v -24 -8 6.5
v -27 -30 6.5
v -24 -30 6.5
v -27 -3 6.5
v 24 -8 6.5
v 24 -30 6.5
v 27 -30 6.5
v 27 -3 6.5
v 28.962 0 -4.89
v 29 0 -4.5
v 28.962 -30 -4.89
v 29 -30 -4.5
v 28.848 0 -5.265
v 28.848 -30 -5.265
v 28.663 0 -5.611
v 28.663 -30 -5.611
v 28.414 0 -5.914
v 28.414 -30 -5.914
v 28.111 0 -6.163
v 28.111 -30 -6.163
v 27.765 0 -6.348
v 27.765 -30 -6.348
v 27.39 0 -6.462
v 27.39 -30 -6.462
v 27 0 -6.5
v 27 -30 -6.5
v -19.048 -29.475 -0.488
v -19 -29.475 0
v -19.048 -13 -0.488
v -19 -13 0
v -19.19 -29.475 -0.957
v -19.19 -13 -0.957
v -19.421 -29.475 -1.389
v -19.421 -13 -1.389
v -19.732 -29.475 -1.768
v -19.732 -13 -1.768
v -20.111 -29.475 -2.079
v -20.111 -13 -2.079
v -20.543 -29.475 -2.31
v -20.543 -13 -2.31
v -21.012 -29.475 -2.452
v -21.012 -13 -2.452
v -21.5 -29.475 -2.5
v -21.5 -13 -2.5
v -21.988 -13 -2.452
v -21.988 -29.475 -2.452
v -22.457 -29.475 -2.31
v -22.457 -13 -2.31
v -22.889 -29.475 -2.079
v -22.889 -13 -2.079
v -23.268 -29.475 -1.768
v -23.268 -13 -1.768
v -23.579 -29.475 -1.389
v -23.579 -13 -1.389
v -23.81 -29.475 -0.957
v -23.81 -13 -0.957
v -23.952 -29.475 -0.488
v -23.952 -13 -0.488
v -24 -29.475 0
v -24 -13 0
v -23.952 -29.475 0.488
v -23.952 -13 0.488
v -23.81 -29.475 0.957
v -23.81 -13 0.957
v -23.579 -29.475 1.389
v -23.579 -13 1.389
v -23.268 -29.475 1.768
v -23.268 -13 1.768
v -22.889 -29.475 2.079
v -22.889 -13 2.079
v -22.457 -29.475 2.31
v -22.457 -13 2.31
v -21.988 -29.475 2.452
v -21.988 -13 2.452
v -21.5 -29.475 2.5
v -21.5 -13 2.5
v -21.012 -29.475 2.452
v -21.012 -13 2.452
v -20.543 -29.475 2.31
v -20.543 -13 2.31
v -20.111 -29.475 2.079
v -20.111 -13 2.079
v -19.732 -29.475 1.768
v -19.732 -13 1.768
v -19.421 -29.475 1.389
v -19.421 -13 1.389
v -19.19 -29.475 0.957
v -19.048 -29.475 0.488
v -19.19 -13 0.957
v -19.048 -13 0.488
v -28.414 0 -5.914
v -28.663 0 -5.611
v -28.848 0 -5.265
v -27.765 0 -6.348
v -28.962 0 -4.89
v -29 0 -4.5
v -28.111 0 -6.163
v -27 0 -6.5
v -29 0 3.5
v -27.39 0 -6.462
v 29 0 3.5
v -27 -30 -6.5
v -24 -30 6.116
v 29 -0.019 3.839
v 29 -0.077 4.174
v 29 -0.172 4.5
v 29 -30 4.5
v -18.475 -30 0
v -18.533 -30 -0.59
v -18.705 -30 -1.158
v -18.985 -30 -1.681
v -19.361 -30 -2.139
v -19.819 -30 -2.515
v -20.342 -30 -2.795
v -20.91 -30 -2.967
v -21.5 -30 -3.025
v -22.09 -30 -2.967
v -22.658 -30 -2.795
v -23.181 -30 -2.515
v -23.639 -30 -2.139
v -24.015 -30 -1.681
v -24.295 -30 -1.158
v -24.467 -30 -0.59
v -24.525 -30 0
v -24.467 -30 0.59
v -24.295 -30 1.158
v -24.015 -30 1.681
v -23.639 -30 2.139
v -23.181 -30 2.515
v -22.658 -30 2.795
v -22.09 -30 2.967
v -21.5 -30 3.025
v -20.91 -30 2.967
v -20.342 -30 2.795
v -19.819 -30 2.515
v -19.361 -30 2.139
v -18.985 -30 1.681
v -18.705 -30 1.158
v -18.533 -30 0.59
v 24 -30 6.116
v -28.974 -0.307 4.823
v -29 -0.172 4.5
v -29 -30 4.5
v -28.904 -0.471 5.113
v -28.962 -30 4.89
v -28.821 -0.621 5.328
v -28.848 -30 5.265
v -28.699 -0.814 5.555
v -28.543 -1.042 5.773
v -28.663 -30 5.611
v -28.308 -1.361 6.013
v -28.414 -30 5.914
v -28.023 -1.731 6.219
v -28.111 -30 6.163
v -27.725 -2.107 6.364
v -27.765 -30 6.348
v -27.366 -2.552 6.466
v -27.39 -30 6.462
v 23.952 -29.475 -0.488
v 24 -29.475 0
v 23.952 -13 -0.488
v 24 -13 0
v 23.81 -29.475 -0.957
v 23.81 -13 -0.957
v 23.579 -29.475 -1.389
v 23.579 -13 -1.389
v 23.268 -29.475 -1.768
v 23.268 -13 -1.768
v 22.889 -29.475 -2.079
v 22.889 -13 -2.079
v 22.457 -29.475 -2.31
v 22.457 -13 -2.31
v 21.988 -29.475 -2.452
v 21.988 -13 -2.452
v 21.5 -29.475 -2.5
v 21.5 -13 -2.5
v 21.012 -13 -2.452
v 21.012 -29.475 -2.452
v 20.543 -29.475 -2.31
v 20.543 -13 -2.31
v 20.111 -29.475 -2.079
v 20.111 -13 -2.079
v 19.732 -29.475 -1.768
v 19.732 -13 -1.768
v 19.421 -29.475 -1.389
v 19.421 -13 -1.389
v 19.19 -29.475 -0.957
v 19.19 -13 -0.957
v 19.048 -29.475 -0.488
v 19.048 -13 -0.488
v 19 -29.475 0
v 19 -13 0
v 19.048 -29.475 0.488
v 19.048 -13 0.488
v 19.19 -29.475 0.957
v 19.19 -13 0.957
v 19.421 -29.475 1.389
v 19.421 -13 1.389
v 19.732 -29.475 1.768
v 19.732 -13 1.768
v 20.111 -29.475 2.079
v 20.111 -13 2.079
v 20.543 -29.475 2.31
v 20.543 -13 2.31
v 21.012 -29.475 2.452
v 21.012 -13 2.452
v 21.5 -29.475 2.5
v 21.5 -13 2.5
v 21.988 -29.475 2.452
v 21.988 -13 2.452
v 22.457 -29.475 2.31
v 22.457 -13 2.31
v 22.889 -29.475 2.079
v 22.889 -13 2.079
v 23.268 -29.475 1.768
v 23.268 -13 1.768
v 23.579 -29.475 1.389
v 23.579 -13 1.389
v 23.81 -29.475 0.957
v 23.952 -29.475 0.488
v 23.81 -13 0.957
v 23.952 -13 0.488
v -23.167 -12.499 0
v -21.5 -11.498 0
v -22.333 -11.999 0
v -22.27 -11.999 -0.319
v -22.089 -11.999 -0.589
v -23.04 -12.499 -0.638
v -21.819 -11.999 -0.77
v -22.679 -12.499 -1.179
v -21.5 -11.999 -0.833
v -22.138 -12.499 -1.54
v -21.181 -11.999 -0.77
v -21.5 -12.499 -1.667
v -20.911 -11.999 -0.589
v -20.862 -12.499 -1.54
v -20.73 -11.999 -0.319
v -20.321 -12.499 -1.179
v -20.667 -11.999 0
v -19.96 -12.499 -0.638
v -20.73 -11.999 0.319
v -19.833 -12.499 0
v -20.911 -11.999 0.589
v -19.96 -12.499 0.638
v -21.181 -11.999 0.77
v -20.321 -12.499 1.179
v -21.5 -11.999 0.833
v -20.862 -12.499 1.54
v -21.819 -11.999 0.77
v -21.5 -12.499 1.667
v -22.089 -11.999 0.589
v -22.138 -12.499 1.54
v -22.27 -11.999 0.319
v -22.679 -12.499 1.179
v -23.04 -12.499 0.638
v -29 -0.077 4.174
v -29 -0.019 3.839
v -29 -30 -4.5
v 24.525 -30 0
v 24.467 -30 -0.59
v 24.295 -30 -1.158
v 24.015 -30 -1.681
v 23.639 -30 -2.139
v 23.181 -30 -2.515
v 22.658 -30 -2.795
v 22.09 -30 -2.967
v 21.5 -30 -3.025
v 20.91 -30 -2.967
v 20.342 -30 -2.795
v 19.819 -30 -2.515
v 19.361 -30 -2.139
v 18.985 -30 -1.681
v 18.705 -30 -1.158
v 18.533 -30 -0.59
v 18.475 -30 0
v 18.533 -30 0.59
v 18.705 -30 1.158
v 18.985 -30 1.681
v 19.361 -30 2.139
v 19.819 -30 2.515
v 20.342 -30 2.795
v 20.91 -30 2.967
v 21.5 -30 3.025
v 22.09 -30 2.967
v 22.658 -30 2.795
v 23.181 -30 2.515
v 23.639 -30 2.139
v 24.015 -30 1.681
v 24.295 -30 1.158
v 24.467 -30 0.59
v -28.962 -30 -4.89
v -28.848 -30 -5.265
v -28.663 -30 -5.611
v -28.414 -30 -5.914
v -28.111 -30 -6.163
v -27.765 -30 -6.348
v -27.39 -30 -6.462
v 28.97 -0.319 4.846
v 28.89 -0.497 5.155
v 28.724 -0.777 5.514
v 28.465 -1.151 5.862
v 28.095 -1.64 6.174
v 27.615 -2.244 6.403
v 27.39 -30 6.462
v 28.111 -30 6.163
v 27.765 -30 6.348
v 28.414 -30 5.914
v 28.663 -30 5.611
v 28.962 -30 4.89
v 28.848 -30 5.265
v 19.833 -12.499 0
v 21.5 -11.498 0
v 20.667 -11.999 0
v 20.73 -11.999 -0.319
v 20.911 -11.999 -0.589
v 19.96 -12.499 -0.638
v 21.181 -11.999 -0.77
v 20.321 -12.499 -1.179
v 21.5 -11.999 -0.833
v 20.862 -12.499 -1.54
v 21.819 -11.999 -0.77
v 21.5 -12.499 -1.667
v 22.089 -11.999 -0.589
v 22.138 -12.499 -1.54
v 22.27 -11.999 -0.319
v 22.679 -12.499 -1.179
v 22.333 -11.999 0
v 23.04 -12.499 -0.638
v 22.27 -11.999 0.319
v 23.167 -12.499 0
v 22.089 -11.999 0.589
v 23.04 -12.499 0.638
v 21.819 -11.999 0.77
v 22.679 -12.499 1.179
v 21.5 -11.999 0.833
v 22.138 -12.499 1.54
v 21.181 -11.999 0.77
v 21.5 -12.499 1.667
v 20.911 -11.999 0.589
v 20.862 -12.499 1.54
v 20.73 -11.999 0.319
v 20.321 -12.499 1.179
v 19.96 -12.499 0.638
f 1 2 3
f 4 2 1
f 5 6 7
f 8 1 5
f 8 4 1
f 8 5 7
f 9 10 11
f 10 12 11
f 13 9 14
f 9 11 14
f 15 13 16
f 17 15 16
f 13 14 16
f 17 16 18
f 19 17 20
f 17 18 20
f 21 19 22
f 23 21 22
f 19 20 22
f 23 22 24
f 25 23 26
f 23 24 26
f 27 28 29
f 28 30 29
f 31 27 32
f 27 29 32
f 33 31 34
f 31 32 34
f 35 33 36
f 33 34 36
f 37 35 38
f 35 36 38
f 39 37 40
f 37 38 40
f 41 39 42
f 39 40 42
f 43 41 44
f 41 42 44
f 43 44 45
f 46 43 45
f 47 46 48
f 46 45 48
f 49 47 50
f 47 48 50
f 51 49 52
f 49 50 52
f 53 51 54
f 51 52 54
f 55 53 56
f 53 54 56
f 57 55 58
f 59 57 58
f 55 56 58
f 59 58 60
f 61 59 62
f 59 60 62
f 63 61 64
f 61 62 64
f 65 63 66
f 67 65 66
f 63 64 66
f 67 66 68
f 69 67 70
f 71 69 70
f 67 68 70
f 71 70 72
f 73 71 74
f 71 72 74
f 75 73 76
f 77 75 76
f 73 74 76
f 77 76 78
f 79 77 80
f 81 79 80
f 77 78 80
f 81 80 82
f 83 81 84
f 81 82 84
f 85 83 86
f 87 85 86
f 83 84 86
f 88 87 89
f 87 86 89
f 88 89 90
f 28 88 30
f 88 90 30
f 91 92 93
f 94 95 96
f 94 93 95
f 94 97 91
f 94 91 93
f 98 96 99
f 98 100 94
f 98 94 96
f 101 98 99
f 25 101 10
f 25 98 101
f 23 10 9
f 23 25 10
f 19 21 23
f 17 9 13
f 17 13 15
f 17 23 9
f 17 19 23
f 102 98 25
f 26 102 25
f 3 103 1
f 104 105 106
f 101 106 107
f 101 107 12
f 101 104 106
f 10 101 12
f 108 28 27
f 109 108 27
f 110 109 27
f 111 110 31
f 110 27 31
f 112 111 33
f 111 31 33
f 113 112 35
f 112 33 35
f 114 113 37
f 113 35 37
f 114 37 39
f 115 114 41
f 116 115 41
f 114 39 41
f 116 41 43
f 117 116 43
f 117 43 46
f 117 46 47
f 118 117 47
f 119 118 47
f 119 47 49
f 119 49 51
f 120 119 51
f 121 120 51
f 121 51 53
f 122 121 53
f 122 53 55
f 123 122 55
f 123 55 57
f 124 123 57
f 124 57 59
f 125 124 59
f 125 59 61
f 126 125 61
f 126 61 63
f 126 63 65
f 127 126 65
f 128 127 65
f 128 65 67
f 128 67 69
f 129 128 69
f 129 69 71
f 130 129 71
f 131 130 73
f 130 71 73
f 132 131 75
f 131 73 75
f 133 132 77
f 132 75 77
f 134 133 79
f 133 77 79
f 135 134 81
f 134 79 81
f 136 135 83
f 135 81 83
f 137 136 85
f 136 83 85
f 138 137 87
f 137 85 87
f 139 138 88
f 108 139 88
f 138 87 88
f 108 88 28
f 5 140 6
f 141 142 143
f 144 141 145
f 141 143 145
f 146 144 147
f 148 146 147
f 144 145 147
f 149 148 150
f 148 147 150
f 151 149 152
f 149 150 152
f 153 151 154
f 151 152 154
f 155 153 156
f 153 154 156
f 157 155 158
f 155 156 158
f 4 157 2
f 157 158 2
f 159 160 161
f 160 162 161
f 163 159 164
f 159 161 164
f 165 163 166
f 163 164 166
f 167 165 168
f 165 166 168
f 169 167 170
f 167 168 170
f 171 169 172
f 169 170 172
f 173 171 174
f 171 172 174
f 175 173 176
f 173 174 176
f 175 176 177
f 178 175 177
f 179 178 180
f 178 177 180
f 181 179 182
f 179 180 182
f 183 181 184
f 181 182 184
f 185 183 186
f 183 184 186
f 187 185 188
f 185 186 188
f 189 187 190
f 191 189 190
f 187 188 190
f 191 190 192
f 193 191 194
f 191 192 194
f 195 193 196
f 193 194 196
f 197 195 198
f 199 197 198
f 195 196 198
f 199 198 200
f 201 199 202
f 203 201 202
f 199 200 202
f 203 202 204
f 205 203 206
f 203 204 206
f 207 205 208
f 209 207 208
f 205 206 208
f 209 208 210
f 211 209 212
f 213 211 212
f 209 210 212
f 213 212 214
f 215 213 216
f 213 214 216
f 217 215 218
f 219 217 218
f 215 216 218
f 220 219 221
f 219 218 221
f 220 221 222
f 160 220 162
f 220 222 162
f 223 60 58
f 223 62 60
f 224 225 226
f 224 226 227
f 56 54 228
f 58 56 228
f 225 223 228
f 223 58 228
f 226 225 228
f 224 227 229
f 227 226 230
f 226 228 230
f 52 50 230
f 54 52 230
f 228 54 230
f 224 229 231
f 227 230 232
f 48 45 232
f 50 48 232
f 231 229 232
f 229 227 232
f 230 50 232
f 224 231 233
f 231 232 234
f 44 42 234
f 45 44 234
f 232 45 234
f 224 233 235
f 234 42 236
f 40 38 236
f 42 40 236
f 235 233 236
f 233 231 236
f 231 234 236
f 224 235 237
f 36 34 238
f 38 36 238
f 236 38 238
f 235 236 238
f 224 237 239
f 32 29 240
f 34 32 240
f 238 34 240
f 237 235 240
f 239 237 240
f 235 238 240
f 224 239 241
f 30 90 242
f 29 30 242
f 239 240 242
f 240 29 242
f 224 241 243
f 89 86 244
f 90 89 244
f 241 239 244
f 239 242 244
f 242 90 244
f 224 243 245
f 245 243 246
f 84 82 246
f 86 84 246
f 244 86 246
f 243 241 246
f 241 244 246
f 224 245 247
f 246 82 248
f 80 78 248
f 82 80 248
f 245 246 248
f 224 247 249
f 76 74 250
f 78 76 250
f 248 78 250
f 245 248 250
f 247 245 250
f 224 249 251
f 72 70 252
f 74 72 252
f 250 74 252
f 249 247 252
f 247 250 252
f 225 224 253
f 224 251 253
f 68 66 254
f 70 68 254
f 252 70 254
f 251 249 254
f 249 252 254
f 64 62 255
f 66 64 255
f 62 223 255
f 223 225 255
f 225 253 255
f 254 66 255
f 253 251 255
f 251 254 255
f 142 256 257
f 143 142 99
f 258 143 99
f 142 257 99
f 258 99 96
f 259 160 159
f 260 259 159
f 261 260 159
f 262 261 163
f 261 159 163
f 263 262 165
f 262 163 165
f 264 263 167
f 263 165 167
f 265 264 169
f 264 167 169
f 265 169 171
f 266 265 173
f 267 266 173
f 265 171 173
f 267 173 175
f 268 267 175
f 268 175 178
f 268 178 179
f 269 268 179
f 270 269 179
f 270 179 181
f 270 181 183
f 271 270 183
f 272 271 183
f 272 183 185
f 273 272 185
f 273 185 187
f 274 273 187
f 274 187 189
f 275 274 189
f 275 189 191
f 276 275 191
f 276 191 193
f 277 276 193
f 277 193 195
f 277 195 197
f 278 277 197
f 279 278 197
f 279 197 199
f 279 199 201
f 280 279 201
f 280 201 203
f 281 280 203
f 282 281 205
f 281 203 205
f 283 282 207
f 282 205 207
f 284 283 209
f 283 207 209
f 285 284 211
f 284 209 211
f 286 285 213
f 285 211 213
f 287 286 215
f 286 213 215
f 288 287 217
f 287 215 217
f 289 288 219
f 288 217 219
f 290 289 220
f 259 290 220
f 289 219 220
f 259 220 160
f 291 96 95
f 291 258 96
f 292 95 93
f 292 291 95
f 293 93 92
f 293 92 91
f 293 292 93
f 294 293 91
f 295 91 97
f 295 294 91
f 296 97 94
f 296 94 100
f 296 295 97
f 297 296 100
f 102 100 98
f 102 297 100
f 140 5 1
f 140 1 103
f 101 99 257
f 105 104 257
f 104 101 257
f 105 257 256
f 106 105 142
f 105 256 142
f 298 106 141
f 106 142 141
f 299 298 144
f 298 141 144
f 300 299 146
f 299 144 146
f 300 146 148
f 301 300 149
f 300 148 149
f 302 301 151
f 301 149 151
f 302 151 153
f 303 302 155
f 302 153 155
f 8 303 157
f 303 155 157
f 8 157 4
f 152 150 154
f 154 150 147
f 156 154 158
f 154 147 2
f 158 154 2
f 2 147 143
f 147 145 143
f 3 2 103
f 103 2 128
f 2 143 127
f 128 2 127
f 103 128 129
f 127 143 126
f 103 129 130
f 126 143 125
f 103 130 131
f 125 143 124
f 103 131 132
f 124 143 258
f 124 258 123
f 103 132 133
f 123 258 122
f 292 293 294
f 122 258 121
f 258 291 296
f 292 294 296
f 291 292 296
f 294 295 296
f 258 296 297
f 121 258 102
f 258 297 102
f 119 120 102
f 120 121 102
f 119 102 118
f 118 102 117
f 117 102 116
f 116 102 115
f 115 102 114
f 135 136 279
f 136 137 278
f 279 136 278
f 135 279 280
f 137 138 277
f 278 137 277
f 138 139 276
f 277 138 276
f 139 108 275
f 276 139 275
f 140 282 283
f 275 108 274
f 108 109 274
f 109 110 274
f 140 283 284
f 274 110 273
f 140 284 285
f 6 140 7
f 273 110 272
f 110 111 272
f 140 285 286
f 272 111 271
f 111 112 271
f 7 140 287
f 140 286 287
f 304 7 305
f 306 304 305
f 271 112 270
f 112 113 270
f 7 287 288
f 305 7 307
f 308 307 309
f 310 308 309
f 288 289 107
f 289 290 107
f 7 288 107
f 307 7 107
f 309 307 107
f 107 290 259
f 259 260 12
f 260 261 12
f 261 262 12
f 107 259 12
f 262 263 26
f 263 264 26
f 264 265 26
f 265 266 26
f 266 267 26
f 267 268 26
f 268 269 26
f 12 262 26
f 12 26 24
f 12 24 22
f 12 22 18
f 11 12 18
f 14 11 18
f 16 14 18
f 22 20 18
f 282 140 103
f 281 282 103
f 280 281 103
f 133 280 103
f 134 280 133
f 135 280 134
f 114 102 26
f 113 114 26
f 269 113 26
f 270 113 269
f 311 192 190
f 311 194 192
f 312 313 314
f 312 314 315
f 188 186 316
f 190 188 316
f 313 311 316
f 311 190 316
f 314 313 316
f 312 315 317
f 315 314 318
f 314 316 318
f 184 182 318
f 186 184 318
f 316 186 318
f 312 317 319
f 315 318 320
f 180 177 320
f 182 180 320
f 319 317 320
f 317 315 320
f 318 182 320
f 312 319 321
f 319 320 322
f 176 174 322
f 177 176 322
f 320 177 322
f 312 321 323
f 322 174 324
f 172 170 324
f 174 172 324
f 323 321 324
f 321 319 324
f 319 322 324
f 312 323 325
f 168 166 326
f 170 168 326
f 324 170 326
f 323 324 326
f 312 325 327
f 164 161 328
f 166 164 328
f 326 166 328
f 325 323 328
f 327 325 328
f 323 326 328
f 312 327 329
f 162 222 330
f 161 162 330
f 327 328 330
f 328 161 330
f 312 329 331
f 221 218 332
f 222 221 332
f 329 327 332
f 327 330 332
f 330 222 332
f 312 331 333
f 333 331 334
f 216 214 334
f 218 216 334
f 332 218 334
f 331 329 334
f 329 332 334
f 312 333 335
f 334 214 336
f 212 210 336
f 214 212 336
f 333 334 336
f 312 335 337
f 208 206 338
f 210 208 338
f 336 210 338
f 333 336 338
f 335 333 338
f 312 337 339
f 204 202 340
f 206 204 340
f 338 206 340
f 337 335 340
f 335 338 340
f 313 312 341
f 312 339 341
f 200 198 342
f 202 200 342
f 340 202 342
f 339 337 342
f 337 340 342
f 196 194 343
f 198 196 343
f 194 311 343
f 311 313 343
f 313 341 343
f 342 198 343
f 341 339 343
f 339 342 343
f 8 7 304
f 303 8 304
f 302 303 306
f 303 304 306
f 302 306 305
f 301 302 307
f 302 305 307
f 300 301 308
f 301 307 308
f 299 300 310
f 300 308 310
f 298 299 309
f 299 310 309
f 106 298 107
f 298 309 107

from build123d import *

# Parameters (mm, degrees)
SKETCH1_W                   = 58
SKETCH1_H                   = 13
BOSS_EXTRUDE1_DEPTH         = 30
FILLET1_R                   = 2
FILLET2_R                   = 3
M6_TAPPED_HOLE1_D           = 5
M6_TAPPED_HOLE1_DEPTH       = 17
M6_TAPPED_HOLE1_CSINK_D     = 6.05
M6_TAPPED_HOLE1_CSINK_ANGLE = 90
M6_TAPPED_HOLE1_TIP         = 1.502151548
CUT_EXTRUDE1_DEPTH          = 24


with BuildPart() as part:
    # Sketch1 → Boss-Extrude1 (new body)
    with BuildSketch(Plane(origin=(0, 0, 0), x_dir=(1, 0, 0), z_dir=(0, 1, 0))):
        Rectangle(SKETCH1_W, SKETCH1_H)
    extrude(amount=-BOSS_EXTRUDE1_DEPTH)

    # Fillet1
    fillet1_edges = [part.edges().sort_by_distance(p)[0] for p in [
        (29, -15, 6.5),
        (-29, -15, 6.5),
        (-29, -15, -6.5),
        (29, -15, -6.5),
    ]]
    fillet(fillet1_edges, radius=FILLET1_R)

    # Fillet2
    # the kernel refuses this fillet: 3 mm, written as the material it takes off along each edge
    with BuildSketch(Plane(origin=(-34.5, 0, 6.5), x_dir=(0, -1, 0), z_dir=(1, 0, 0))) as fillet2_piece_1:
        with BuildLine():
            CenterArc((FILLET2_R, FILLET2_R), FILLET2_R, 180, 90)
            Line((0, FILLET2_R), (0, 0))
            Line((0, 0), (FILLET2_R, 0))
        make_face()
    extrude(amount=69, mode=Mode.SUBTRACT)

    # M6 Tapped Hole1
    with Locations(Plane(origin=(0, -30, 0), x_dir=(-1, 0, 0), z_dir=(0, -1, 0))):
        with Locations((-21.5, 0), (21.5, 0)):
            CounterSinkHole(M6_TAPPED_HOLE1_D / 2, M6_TAPPED_HOLE1_CSINK_D / 2, depth=M6_TAPPED_HOLE1_DEPTH, counter_sink_angle=M6_TAPPED_HOLE1_CSINK_ANGLE)
            with Locations((0, 0, -(M6_TAPPED_HOLE1_DEPTH + M6_TAPPED_HOLE1_TIP / 2))):  # 118° drill point
                Cone(0, M6_TAPPED_HOLE1_D / 2, M6_TAPPED_HOLE1_TIP, mode=Mode.SUBTRACT)

    # Sketch5 → Cut-Extrude1 (cut, symmetric)
    with BuildSketch(Plane(origin=(0, 0, 0), x_dir=(0, 0, -1), z_dir=(1, 0, 0))):
        Polygon((-6.5, -8), (-6.115988572, -30), (-6.5, -30), align=None)
    extrude(amount=CUT_EXTRUDE1_DEPTH, both=True, mode=Mode.SUBTRACT)


solid = part.part
